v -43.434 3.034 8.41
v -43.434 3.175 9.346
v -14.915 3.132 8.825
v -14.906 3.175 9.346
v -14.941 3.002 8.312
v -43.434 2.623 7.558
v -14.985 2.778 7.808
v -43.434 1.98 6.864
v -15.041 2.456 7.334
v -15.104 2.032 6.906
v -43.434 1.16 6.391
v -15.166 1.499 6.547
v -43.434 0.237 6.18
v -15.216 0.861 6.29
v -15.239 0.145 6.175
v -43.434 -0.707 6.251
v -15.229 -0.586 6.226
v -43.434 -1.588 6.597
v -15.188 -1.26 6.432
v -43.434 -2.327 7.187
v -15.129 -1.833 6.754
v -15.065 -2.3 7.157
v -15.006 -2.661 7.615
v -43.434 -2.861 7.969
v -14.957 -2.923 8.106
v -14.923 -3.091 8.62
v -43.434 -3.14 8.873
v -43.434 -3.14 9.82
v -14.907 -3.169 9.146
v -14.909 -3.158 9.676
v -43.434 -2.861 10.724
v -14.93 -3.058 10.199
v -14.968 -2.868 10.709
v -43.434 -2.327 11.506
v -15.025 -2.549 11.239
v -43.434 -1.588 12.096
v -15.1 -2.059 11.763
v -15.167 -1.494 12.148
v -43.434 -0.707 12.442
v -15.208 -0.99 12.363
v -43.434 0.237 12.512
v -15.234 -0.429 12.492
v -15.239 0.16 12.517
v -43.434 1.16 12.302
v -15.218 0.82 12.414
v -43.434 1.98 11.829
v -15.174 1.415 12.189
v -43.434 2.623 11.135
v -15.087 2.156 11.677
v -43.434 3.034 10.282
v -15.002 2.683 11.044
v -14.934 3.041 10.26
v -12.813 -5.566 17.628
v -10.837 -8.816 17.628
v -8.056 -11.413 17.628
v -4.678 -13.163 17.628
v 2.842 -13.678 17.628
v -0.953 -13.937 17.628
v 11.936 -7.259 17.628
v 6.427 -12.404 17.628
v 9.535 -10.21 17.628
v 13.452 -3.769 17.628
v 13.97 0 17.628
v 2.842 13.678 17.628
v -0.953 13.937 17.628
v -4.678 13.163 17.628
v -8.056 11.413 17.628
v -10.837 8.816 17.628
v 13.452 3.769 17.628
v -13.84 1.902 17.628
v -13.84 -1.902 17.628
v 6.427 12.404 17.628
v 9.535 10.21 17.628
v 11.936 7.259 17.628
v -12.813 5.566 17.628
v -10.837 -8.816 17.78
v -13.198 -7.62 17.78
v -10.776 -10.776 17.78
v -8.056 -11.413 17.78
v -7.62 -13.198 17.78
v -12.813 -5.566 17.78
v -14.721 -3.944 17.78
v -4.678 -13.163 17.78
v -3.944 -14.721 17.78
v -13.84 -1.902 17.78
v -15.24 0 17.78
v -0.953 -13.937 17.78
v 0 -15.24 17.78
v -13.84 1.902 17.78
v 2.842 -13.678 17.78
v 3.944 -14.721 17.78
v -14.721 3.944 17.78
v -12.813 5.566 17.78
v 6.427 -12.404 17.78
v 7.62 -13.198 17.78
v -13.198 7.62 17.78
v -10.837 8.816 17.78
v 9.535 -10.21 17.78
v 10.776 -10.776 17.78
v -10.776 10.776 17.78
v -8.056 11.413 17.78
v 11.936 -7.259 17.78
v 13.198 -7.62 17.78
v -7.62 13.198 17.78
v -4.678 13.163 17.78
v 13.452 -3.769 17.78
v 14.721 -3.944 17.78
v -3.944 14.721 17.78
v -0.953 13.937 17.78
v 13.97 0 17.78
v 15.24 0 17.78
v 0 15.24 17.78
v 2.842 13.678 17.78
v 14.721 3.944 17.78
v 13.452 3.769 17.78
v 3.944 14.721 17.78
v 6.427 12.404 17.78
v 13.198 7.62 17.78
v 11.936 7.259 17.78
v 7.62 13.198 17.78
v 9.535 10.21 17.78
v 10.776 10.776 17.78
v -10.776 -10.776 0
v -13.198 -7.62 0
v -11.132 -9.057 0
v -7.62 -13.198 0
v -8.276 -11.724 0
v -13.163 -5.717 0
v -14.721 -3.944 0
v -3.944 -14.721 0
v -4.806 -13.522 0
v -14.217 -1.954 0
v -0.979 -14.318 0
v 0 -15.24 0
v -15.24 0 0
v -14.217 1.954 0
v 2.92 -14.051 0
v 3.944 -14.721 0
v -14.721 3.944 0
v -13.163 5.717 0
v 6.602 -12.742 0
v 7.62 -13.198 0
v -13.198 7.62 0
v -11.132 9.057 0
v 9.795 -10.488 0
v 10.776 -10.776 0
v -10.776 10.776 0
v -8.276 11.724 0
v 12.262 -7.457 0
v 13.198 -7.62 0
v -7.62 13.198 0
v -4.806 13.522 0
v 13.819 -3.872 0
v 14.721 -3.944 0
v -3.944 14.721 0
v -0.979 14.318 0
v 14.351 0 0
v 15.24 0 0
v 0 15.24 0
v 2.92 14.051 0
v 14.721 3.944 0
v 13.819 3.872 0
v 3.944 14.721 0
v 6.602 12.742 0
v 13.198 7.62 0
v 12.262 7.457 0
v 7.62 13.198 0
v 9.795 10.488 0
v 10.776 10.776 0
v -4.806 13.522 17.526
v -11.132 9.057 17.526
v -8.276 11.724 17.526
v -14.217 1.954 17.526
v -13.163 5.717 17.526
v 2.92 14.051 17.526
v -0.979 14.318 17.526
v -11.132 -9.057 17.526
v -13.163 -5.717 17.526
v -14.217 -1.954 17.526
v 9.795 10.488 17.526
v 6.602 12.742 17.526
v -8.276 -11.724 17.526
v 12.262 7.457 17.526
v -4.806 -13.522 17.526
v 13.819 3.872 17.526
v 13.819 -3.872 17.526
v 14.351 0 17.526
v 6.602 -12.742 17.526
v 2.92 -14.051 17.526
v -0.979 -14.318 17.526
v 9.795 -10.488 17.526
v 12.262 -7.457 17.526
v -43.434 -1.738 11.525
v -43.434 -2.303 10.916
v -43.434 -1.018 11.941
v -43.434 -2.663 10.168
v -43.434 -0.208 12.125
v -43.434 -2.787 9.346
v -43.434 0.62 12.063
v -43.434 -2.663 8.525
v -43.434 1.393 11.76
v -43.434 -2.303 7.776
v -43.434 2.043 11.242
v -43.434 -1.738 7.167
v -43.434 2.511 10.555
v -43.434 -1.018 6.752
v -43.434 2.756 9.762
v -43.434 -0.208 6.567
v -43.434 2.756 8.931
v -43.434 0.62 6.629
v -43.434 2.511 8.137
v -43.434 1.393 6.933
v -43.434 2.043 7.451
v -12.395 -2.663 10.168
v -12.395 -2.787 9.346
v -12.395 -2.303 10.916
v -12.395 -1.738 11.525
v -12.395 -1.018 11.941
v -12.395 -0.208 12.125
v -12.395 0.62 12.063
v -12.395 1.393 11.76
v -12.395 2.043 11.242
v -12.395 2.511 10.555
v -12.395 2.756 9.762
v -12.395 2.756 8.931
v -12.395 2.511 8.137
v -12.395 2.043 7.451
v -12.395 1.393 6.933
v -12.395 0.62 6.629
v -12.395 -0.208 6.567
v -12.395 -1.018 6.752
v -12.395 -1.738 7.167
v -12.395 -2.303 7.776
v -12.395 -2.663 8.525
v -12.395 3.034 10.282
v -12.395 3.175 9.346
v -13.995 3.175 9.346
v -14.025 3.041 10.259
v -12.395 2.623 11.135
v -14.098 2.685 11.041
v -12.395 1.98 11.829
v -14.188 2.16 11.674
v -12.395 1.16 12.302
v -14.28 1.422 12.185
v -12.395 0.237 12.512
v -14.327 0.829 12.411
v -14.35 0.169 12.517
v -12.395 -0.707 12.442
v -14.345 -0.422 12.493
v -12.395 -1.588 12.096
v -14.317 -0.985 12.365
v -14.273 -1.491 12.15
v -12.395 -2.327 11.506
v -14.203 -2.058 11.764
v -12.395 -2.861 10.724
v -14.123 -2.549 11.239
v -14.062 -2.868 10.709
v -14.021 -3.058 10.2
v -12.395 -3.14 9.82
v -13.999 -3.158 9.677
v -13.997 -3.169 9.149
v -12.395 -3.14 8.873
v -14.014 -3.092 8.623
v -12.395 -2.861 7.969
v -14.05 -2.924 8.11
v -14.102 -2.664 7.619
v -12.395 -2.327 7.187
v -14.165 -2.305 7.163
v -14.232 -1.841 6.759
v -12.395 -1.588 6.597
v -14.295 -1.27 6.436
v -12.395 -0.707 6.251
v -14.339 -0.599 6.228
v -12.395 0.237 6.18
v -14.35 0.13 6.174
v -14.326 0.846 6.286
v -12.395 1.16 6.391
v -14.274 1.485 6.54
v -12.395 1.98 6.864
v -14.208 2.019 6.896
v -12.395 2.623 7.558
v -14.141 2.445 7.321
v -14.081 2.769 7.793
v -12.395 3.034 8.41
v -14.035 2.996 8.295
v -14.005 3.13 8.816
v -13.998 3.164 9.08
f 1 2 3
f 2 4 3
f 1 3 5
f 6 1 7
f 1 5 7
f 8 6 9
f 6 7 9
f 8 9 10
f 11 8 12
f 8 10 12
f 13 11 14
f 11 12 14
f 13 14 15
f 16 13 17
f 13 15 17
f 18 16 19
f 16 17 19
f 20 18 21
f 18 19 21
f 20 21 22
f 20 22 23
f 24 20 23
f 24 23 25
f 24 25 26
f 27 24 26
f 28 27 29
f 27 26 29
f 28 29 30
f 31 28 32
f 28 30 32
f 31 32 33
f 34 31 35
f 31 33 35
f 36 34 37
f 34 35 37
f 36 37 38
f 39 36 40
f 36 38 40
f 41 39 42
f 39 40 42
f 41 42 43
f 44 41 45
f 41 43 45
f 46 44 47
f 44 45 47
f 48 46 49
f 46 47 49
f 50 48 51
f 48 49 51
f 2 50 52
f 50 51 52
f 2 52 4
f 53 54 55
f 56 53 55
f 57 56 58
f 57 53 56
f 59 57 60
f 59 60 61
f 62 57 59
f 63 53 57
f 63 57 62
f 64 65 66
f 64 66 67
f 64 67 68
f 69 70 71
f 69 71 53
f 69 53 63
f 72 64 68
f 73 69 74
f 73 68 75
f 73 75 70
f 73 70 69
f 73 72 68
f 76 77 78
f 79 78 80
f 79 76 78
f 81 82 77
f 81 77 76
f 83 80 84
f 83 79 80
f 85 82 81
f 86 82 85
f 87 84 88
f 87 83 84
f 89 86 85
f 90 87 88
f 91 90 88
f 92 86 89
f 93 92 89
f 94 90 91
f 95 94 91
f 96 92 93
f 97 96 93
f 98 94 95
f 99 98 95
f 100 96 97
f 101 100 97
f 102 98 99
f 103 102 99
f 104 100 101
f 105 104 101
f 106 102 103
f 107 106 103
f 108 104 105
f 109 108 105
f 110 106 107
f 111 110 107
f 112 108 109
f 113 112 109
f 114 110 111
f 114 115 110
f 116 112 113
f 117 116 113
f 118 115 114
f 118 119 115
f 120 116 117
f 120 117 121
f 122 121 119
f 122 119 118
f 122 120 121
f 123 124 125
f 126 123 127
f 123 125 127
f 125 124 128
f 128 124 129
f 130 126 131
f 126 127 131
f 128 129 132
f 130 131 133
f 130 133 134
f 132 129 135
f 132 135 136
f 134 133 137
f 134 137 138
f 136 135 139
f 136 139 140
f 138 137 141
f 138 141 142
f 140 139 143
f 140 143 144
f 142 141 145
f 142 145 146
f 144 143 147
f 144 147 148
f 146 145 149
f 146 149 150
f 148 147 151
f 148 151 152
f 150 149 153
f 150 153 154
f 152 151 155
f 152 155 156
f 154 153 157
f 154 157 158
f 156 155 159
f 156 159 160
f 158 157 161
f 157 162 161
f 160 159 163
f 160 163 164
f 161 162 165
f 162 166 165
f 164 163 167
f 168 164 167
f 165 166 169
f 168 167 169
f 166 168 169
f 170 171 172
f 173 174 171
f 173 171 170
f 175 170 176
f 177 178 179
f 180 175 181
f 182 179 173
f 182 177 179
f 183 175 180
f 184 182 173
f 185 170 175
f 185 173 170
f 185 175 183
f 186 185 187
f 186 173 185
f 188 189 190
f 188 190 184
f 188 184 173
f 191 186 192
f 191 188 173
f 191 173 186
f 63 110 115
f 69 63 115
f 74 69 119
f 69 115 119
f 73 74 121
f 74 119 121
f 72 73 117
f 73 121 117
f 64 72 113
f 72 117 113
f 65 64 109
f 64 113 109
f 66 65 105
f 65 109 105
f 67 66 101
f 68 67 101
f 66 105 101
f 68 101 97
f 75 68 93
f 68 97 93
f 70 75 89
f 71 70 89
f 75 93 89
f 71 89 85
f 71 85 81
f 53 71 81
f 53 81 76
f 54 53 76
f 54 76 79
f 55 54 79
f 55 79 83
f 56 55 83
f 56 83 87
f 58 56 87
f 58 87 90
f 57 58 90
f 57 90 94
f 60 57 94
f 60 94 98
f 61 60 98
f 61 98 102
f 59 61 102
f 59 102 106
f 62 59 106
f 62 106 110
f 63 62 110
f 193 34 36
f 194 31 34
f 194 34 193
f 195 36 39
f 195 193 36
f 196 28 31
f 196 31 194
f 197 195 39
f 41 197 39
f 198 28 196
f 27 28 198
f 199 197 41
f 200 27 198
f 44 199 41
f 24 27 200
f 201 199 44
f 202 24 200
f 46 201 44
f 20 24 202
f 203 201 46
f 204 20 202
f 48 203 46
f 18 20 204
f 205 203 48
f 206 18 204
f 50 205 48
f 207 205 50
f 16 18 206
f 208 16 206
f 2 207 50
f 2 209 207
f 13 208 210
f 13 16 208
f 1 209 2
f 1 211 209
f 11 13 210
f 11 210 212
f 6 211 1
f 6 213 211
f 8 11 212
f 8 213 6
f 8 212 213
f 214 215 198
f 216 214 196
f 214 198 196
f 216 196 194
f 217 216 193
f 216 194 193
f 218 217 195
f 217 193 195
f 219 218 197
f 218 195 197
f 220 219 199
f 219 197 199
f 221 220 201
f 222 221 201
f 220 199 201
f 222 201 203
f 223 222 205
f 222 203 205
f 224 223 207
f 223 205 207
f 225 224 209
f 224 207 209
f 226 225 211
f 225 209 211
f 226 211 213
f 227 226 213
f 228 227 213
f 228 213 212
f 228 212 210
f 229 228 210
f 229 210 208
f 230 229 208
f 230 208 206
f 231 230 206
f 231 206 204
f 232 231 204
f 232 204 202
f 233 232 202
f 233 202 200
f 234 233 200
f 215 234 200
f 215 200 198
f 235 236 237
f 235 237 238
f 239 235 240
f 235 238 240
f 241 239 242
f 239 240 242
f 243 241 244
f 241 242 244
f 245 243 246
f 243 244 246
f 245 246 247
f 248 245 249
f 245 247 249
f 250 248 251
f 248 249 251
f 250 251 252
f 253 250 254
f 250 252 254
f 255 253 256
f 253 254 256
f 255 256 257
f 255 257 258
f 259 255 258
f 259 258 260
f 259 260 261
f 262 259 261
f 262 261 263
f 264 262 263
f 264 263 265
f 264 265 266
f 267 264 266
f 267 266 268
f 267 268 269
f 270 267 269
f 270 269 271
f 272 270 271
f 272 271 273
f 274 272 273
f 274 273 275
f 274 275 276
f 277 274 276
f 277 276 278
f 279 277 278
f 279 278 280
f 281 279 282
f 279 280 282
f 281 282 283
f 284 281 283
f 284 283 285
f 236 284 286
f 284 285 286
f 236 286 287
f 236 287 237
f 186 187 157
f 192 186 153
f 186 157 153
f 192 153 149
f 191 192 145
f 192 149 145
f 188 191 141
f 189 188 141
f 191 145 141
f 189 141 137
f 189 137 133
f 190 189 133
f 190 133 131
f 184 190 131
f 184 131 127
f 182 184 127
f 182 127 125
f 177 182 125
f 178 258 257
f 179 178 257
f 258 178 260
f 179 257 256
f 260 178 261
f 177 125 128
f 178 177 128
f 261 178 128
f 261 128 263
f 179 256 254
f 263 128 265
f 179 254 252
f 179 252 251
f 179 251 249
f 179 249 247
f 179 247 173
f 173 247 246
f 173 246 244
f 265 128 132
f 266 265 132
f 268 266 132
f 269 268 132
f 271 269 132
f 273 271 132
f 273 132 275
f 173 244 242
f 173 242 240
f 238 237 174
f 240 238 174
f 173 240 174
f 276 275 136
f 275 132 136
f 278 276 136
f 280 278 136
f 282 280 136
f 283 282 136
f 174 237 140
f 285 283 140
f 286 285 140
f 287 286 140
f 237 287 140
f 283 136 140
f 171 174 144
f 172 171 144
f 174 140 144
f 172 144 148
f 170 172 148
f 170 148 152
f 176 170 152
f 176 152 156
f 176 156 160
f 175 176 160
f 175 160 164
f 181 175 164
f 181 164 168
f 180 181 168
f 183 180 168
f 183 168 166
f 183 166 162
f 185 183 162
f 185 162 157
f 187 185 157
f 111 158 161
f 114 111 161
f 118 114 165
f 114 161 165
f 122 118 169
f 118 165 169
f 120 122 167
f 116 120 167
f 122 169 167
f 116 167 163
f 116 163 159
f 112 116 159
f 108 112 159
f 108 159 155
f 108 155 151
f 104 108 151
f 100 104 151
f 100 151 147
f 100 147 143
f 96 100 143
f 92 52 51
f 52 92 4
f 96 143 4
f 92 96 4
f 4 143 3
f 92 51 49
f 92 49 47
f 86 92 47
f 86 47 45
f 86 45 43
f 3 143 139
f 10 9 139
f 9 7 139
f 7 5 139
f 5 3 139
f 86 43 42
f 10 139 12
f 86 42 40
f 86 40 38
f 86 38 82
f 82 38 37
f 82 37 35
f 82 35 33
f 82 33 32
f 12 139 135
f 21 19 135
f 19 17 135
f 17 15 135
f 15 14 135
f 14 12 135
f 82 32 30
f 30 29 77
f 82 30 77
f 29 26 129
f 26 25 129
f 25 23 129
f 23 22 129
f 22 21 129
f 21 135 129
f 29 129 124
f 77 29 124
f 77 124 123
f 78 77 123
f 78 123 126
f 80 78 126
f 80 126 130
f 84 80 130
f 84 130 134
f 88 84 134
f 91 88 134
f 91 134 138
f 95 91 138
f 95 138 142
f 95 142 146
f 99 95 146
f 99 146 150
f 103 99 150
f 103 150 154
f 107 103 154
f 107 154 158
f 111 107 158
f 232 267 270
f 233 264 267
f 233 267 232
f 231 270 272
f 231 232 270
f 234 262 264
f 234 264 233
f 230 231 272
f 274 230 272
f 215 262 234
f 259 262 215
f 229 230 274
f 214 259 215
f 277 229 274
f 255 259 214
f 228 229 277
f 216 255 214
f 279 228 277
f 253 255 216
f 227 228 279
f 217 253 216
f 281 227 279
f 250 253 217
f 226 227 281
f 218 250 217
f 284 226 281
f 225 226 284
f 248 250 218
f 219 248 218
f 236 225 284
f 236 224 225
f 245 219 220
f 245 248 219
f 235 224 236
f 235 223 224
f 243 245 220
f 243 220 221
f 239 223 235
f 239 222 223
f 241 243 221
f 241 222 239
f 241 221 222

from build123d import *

# Parameters (mm, degrees)
F0_R       = 15.24
F1_DEPTH   = 17.78
F2_R       = 14.351
F3_DEPTH   = 17.526
F5_R       = 3.175
F6_DEPTH   = 25.1968
F6_FACE_R  = 3.175
F7_DEPTH   = 5.842
F8_R       = 2.786893
F9_DEPTH   = 33.5026
F12_R      = 13.97
F13_DEPTH  = 0.4572
F13_FACE_R = 13.97
F14_DEPTH  = 0.6096


with BuildPart() as f1:
    # F0 (on Top) → F1 (new body)
    with BuildSketch(Plane.XY):
        Circle(F0_R)
    extrude(amount=F1_DEPTH)

    # F2 (on face) → F3 (cut)
    with BuildSketch(Plane(origin=(0, 0, 0), x_dir=(1, 0, 0), z_dir=(0, 0, -1))):
        Circle(F2_R)
    extrude(amount=-F3_DEPTH, mode=Mode.SUBTRACT)

    # F5 (on offset) → F6 (join)
    with BuildSketch(Plane.YZ.offset(-37.592)):
        with Locations((0, 9.3463)):
            Circle(F5_R)
    extrude(amount=F6_DEPTH)

    # F6_face (on face) → F7 (join)
    with BuildSketch(Plane(origin=(-37.592, 0, 9.3463), x_dir=(0, 1, 0), z_dir=(-1, 0, 0))):
        Circle(F6_FACE_R)
    extrude(amount=F7_DEPTH)

    # F8 (on face) → F9 (cut)
    with BuildSketch(Plane(origin=(-43.434, 0, 0), x_dir=(0, -1, 0), z_dir=(-1, 0, 0))):
        with Locations((0, 9.3463)):
            Circle(F8_R)
    extrude(amount=-F9_DEPTH, mode=Mode.SUBTRACT)

    # F12 (on face) → F13 (join)
    with BuildSketch(Plane.XY.offset(17.78)):
        Circle(F12_R)
    extrude(amount=F13_DEPTH)

    # F13_face (on face) → F14 (cut)
    with BuildSketch(Plane.XY.offset(18.2372)):
        Circle(F13_FACE_R)
    extrude(amount=-F14_DEPTH, mode=Mode.SUBTRACT)


solid = f1.part
